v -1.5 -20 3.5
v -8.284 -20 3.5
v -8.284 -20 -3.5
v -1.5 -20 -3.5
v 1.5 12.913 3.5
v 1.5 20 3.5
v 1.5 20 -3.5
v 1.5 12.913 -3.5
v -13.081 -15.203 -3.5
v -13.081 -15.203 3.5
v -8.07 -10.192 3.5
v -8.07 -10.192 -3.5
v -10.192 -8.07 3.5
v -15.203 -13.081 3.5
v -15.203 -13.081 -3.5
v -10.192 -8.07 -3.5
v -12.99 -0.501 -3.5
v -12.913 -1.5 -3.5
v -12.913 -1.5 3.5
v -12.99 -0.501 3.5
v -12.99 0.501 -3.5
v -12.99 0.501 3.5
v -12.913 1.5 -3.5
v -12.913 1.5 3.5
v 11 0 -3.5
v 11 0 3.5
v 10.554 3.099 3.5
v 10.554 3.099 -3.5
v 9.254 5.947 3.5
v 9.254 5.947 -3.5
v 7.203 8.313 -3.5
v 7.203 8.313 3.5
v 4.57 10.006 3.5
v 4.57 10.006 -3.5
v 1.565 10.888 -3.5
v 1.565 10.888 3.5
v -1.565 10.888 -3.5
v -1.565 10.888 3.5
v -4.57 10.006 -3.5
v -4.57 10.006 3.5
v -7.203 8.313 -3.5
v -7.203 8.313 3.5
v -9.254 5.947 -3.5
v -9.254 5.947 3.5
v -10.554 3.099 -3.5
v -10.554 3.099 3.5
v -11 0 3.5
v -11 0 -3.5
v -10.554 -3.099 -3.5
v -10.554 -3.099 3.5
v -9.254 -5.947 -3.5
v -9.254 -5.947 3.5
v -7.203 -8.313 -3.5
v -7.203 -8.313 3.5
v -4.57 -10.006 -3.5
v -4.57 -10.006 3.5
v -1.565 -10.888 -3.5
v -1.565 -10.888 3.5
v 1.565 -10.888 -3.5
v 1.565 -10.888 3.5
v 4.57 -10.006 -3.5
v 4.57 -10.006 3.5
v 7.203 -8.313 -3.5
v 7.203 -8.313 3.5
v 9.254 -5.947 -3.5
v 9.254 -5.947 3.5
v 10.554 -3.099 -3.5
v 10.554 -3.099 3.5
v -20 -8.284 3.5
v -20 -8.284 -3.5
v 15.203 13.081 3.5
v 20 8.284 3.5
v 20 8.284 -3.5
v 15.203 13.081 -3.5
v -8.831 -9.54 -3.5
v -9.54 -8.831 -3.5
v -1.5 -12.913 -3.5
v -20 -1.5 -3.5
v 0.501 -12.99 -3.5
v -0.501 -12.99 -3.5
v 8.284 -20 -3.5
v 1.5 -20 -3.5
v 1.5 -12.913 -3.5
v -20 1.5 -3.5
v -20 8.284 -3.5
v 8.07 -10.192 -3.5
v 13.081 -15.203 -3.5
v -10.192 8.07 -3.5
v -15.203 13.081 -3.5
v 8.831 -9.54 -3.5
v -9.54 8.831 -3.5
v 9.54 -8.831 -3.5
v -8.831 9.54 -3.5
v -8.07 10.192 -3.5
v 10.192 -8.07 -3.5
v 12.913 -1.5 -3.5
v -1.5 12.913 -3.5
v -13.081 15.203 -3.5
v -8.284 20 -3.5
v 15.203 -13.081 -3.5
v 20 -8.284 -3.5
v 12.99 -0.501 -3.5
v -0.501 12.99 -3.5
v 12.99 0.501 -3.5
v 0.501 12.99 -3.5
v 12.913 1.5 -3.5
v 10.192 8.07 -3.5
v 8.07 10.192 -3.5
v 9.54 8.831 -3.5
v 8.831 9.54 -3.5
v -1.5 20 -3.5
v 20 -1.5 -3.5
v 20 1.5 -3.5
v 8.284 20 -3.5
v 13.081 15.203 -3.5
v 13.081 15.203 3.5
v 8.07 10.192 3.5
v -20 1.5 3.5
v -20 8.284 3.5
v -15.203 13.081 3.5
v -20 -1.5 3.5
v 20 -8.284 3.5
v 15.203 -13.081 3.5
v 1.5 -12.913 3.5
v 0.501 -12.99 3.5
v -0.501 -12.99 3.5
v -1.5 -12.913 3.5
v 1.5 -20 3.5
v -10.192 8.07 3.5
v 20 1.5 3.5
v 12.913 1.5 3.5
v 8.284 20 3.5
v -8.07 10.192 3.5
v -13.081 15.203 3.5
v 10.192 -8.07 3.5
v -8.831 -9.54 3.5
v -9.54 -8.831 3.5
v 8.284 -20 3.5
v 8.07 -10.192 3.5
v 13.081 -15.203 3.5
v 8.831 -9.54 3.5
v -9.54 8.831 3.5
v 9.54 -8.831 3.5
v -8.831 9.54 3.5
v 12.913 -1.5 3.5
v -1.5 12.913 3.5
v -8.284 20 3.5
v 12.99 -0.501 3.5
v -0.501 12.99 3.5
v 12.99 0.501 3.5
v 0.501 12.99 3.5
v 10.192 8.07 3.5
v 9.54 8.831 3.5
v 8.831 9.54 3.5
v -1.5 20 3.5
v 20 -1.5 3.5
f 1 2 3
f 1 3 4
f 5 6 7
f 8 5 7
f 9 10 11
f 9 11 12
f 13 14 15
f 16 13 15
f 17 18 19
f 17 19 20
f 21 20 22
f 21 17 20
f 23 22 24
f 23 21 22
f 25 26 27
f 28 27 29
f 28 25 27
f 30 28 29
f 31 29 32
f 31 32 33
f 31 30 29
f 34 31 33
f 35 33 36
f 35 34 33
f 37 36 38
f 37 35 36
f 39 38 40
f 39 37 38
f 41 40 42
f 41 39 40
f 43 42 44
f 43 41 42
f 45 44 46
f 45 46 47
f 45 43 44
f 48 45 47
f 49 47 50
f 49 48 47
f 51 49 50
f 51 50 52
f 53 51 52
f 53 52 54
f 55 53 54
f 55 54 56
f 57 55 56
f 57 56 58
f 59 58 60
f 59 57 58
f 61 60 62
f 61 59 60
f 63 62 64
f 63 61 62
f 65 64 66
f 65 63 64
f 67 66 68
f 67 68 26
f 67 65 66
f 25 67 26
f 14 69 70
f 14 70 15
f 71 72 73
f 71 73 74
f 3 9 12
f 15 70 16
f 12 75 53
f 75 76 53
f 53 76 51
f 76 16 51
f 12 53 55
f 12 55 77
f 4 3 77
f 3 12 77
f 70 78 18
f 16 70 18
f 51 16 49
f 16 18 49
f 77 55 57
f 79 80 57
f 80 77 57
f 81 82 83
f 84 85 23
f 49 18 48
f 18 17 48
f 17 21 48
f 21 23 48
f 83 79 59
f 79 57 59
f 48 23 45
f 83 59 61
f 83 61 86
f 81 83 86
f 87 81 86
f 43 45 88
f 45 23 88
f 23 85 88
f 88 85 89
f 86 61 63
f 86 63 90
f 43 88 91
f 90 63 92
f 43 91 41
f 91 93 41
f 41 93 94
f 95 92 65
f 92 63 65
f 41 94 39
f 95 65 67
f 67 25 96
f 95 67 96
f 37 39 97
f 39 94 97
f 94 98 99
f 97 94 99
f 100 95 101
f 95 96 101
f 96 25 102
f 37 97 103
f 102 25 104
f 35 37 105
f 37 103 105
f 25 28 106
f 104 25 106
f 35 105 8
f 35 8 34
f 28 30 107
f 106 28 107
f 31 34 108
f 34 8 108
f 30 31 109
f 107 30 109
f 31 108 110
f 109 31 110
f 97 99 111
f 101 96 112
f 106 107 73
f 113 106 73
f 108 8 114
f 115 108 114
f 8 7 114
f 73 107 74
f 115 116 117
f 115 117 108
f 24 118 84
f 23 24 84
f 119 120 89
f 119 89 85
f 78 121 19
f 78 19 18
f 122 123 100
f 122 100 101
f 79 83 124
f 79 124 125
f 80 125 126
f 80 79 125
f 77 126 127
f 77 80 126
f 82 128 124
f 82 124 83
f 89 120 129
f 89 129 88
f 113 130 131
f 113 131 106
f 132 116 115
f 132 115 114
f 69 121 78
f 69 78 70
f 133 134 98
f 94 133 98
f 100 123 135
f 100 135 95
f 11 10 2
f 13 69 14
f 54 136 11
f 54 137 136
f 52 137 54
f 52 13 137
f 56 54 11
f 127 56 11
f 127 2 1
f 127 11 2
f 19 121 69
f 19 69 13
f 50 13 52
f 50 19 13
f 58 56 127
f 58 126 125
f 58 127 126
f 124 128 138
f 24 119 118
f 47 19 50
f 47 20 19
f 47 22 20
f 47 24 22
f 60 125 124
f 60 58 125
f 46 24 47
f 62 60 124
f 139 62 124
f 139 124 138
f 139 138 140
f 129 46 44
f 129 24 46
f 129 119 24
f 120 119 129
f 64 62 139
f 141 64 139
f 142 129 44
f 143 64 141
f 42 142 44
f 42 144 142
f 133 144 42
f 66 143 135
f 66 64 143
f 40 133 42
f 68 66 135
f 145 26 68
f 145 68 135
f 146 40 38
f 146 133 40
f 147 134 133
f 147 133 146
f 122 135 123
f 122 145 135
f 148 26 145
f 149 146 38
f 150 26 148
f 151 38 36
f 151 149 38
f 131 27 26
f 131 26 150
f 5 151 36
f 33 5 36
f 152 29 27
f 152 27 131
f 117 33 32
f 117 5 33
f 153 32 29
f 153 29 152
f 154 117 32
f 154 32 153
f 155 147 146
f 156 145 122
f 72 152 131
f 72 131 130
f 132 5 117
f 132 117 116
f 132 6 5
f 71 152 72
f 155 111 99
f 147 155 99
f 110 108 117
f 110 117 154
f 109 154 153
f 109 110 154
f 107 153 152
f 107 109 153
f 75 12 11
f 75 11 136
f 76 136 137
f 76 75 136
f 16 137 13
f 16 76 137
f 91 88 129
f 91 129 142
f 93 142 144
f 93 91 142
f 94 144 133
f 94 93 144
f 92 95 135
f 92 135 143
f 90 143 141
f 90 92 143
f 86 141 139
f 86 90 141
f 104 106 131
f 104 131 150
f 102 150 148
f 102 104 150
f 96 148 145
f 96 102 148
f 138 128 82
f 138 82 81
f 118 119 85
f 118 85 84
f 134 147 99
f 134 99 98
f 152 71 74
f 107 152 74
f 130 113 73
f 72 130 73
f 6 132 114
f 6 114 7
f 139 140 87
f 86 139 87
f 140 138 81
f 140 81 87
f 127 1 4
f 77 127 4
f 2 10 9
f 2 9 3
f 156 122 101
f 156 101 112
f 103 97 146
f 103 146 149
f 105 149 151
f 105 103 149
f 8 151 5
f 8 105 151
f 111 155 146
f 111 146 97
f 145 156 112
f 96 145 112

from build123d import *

# Parameters (mm, degrees)
SKETCH1_R               = 11
BOSS_EXTRUDE1_DEPTH     = 3.5
CUT_EXTRUDE3_REACH      = 46.858
CUT_EXTRUDE3_END_RADIUS = 13
SKETCH2_W               = 3
SKETCH2_H               = 8
CIRPATTERN1_COUNT       = 8


with BuildPart() as part:
    # Sketch1 → Boss-Extrude1 (new, symmetric)
    with BuildSketch(Plane.XY):
        Polygon((8.284271247, 20), (-8.284271247, 20), (-20, 8.284271247), (-20, -8.284271247), (-8.284271247, -20), (8.284271247, -20), (20, -8.284271247), (20, 8.284271247), align=None)
        Circle(SKETCH1_R, mode=Mode.SUBTRACT)
    extrude(amount=BOSS_EXTRUDE1_DEPTH, both=True)

    # Cut-Extrude3: up to this cylinder (the profile starts outside it)
    cut_extrude3_end = Plane(origin=(0, 0, 0), z_dir=(0, 0, -1)) * Cylinder(CUT_EXTRUDE3_END_RADIUS, 120.716, mode=Mode.PRIVATE)
    # Sketch2 → Cut-Extrude3 (cut, up to the surface)
    with BuildSketch(Plane(origin=(0, -20, 0), x_dir=(-1, 0, 0), z_dir=(0, -1, 0)), mode=Mode.PRIVATE) as cut_extrude3_sk1:
        Rectangle(SKETCH2_W, SKETCH2_H)
    cut_extrude3_tool1 = extrude(cut_extrude3_sk1.sketch, amount=-CUT_EXTRUDE3_REACH, mode=Mode.PRIVATE) - cut_extrude3_end
    cut_extrude3 = cut_extrude3_tool1.solids().sort_by_distance((0, -20, 0))[0]
    add(cut_extrude3, mode=Mode.SUBTRACT)

    # CirPattern1: Cut-Extrude3 ×8 about axis
    cirpattern1_axis = Axis((0, 0, 0), (0, 0, 1))
    for i in range(1, CIRPATTERN1_COUNT):
        add(cut_extrude3.rotate(cirpattern1_axis, i * 360 / CIRPATTERN1_COUNT), mode=Mode.SUBTRACT)


solid = part.part
